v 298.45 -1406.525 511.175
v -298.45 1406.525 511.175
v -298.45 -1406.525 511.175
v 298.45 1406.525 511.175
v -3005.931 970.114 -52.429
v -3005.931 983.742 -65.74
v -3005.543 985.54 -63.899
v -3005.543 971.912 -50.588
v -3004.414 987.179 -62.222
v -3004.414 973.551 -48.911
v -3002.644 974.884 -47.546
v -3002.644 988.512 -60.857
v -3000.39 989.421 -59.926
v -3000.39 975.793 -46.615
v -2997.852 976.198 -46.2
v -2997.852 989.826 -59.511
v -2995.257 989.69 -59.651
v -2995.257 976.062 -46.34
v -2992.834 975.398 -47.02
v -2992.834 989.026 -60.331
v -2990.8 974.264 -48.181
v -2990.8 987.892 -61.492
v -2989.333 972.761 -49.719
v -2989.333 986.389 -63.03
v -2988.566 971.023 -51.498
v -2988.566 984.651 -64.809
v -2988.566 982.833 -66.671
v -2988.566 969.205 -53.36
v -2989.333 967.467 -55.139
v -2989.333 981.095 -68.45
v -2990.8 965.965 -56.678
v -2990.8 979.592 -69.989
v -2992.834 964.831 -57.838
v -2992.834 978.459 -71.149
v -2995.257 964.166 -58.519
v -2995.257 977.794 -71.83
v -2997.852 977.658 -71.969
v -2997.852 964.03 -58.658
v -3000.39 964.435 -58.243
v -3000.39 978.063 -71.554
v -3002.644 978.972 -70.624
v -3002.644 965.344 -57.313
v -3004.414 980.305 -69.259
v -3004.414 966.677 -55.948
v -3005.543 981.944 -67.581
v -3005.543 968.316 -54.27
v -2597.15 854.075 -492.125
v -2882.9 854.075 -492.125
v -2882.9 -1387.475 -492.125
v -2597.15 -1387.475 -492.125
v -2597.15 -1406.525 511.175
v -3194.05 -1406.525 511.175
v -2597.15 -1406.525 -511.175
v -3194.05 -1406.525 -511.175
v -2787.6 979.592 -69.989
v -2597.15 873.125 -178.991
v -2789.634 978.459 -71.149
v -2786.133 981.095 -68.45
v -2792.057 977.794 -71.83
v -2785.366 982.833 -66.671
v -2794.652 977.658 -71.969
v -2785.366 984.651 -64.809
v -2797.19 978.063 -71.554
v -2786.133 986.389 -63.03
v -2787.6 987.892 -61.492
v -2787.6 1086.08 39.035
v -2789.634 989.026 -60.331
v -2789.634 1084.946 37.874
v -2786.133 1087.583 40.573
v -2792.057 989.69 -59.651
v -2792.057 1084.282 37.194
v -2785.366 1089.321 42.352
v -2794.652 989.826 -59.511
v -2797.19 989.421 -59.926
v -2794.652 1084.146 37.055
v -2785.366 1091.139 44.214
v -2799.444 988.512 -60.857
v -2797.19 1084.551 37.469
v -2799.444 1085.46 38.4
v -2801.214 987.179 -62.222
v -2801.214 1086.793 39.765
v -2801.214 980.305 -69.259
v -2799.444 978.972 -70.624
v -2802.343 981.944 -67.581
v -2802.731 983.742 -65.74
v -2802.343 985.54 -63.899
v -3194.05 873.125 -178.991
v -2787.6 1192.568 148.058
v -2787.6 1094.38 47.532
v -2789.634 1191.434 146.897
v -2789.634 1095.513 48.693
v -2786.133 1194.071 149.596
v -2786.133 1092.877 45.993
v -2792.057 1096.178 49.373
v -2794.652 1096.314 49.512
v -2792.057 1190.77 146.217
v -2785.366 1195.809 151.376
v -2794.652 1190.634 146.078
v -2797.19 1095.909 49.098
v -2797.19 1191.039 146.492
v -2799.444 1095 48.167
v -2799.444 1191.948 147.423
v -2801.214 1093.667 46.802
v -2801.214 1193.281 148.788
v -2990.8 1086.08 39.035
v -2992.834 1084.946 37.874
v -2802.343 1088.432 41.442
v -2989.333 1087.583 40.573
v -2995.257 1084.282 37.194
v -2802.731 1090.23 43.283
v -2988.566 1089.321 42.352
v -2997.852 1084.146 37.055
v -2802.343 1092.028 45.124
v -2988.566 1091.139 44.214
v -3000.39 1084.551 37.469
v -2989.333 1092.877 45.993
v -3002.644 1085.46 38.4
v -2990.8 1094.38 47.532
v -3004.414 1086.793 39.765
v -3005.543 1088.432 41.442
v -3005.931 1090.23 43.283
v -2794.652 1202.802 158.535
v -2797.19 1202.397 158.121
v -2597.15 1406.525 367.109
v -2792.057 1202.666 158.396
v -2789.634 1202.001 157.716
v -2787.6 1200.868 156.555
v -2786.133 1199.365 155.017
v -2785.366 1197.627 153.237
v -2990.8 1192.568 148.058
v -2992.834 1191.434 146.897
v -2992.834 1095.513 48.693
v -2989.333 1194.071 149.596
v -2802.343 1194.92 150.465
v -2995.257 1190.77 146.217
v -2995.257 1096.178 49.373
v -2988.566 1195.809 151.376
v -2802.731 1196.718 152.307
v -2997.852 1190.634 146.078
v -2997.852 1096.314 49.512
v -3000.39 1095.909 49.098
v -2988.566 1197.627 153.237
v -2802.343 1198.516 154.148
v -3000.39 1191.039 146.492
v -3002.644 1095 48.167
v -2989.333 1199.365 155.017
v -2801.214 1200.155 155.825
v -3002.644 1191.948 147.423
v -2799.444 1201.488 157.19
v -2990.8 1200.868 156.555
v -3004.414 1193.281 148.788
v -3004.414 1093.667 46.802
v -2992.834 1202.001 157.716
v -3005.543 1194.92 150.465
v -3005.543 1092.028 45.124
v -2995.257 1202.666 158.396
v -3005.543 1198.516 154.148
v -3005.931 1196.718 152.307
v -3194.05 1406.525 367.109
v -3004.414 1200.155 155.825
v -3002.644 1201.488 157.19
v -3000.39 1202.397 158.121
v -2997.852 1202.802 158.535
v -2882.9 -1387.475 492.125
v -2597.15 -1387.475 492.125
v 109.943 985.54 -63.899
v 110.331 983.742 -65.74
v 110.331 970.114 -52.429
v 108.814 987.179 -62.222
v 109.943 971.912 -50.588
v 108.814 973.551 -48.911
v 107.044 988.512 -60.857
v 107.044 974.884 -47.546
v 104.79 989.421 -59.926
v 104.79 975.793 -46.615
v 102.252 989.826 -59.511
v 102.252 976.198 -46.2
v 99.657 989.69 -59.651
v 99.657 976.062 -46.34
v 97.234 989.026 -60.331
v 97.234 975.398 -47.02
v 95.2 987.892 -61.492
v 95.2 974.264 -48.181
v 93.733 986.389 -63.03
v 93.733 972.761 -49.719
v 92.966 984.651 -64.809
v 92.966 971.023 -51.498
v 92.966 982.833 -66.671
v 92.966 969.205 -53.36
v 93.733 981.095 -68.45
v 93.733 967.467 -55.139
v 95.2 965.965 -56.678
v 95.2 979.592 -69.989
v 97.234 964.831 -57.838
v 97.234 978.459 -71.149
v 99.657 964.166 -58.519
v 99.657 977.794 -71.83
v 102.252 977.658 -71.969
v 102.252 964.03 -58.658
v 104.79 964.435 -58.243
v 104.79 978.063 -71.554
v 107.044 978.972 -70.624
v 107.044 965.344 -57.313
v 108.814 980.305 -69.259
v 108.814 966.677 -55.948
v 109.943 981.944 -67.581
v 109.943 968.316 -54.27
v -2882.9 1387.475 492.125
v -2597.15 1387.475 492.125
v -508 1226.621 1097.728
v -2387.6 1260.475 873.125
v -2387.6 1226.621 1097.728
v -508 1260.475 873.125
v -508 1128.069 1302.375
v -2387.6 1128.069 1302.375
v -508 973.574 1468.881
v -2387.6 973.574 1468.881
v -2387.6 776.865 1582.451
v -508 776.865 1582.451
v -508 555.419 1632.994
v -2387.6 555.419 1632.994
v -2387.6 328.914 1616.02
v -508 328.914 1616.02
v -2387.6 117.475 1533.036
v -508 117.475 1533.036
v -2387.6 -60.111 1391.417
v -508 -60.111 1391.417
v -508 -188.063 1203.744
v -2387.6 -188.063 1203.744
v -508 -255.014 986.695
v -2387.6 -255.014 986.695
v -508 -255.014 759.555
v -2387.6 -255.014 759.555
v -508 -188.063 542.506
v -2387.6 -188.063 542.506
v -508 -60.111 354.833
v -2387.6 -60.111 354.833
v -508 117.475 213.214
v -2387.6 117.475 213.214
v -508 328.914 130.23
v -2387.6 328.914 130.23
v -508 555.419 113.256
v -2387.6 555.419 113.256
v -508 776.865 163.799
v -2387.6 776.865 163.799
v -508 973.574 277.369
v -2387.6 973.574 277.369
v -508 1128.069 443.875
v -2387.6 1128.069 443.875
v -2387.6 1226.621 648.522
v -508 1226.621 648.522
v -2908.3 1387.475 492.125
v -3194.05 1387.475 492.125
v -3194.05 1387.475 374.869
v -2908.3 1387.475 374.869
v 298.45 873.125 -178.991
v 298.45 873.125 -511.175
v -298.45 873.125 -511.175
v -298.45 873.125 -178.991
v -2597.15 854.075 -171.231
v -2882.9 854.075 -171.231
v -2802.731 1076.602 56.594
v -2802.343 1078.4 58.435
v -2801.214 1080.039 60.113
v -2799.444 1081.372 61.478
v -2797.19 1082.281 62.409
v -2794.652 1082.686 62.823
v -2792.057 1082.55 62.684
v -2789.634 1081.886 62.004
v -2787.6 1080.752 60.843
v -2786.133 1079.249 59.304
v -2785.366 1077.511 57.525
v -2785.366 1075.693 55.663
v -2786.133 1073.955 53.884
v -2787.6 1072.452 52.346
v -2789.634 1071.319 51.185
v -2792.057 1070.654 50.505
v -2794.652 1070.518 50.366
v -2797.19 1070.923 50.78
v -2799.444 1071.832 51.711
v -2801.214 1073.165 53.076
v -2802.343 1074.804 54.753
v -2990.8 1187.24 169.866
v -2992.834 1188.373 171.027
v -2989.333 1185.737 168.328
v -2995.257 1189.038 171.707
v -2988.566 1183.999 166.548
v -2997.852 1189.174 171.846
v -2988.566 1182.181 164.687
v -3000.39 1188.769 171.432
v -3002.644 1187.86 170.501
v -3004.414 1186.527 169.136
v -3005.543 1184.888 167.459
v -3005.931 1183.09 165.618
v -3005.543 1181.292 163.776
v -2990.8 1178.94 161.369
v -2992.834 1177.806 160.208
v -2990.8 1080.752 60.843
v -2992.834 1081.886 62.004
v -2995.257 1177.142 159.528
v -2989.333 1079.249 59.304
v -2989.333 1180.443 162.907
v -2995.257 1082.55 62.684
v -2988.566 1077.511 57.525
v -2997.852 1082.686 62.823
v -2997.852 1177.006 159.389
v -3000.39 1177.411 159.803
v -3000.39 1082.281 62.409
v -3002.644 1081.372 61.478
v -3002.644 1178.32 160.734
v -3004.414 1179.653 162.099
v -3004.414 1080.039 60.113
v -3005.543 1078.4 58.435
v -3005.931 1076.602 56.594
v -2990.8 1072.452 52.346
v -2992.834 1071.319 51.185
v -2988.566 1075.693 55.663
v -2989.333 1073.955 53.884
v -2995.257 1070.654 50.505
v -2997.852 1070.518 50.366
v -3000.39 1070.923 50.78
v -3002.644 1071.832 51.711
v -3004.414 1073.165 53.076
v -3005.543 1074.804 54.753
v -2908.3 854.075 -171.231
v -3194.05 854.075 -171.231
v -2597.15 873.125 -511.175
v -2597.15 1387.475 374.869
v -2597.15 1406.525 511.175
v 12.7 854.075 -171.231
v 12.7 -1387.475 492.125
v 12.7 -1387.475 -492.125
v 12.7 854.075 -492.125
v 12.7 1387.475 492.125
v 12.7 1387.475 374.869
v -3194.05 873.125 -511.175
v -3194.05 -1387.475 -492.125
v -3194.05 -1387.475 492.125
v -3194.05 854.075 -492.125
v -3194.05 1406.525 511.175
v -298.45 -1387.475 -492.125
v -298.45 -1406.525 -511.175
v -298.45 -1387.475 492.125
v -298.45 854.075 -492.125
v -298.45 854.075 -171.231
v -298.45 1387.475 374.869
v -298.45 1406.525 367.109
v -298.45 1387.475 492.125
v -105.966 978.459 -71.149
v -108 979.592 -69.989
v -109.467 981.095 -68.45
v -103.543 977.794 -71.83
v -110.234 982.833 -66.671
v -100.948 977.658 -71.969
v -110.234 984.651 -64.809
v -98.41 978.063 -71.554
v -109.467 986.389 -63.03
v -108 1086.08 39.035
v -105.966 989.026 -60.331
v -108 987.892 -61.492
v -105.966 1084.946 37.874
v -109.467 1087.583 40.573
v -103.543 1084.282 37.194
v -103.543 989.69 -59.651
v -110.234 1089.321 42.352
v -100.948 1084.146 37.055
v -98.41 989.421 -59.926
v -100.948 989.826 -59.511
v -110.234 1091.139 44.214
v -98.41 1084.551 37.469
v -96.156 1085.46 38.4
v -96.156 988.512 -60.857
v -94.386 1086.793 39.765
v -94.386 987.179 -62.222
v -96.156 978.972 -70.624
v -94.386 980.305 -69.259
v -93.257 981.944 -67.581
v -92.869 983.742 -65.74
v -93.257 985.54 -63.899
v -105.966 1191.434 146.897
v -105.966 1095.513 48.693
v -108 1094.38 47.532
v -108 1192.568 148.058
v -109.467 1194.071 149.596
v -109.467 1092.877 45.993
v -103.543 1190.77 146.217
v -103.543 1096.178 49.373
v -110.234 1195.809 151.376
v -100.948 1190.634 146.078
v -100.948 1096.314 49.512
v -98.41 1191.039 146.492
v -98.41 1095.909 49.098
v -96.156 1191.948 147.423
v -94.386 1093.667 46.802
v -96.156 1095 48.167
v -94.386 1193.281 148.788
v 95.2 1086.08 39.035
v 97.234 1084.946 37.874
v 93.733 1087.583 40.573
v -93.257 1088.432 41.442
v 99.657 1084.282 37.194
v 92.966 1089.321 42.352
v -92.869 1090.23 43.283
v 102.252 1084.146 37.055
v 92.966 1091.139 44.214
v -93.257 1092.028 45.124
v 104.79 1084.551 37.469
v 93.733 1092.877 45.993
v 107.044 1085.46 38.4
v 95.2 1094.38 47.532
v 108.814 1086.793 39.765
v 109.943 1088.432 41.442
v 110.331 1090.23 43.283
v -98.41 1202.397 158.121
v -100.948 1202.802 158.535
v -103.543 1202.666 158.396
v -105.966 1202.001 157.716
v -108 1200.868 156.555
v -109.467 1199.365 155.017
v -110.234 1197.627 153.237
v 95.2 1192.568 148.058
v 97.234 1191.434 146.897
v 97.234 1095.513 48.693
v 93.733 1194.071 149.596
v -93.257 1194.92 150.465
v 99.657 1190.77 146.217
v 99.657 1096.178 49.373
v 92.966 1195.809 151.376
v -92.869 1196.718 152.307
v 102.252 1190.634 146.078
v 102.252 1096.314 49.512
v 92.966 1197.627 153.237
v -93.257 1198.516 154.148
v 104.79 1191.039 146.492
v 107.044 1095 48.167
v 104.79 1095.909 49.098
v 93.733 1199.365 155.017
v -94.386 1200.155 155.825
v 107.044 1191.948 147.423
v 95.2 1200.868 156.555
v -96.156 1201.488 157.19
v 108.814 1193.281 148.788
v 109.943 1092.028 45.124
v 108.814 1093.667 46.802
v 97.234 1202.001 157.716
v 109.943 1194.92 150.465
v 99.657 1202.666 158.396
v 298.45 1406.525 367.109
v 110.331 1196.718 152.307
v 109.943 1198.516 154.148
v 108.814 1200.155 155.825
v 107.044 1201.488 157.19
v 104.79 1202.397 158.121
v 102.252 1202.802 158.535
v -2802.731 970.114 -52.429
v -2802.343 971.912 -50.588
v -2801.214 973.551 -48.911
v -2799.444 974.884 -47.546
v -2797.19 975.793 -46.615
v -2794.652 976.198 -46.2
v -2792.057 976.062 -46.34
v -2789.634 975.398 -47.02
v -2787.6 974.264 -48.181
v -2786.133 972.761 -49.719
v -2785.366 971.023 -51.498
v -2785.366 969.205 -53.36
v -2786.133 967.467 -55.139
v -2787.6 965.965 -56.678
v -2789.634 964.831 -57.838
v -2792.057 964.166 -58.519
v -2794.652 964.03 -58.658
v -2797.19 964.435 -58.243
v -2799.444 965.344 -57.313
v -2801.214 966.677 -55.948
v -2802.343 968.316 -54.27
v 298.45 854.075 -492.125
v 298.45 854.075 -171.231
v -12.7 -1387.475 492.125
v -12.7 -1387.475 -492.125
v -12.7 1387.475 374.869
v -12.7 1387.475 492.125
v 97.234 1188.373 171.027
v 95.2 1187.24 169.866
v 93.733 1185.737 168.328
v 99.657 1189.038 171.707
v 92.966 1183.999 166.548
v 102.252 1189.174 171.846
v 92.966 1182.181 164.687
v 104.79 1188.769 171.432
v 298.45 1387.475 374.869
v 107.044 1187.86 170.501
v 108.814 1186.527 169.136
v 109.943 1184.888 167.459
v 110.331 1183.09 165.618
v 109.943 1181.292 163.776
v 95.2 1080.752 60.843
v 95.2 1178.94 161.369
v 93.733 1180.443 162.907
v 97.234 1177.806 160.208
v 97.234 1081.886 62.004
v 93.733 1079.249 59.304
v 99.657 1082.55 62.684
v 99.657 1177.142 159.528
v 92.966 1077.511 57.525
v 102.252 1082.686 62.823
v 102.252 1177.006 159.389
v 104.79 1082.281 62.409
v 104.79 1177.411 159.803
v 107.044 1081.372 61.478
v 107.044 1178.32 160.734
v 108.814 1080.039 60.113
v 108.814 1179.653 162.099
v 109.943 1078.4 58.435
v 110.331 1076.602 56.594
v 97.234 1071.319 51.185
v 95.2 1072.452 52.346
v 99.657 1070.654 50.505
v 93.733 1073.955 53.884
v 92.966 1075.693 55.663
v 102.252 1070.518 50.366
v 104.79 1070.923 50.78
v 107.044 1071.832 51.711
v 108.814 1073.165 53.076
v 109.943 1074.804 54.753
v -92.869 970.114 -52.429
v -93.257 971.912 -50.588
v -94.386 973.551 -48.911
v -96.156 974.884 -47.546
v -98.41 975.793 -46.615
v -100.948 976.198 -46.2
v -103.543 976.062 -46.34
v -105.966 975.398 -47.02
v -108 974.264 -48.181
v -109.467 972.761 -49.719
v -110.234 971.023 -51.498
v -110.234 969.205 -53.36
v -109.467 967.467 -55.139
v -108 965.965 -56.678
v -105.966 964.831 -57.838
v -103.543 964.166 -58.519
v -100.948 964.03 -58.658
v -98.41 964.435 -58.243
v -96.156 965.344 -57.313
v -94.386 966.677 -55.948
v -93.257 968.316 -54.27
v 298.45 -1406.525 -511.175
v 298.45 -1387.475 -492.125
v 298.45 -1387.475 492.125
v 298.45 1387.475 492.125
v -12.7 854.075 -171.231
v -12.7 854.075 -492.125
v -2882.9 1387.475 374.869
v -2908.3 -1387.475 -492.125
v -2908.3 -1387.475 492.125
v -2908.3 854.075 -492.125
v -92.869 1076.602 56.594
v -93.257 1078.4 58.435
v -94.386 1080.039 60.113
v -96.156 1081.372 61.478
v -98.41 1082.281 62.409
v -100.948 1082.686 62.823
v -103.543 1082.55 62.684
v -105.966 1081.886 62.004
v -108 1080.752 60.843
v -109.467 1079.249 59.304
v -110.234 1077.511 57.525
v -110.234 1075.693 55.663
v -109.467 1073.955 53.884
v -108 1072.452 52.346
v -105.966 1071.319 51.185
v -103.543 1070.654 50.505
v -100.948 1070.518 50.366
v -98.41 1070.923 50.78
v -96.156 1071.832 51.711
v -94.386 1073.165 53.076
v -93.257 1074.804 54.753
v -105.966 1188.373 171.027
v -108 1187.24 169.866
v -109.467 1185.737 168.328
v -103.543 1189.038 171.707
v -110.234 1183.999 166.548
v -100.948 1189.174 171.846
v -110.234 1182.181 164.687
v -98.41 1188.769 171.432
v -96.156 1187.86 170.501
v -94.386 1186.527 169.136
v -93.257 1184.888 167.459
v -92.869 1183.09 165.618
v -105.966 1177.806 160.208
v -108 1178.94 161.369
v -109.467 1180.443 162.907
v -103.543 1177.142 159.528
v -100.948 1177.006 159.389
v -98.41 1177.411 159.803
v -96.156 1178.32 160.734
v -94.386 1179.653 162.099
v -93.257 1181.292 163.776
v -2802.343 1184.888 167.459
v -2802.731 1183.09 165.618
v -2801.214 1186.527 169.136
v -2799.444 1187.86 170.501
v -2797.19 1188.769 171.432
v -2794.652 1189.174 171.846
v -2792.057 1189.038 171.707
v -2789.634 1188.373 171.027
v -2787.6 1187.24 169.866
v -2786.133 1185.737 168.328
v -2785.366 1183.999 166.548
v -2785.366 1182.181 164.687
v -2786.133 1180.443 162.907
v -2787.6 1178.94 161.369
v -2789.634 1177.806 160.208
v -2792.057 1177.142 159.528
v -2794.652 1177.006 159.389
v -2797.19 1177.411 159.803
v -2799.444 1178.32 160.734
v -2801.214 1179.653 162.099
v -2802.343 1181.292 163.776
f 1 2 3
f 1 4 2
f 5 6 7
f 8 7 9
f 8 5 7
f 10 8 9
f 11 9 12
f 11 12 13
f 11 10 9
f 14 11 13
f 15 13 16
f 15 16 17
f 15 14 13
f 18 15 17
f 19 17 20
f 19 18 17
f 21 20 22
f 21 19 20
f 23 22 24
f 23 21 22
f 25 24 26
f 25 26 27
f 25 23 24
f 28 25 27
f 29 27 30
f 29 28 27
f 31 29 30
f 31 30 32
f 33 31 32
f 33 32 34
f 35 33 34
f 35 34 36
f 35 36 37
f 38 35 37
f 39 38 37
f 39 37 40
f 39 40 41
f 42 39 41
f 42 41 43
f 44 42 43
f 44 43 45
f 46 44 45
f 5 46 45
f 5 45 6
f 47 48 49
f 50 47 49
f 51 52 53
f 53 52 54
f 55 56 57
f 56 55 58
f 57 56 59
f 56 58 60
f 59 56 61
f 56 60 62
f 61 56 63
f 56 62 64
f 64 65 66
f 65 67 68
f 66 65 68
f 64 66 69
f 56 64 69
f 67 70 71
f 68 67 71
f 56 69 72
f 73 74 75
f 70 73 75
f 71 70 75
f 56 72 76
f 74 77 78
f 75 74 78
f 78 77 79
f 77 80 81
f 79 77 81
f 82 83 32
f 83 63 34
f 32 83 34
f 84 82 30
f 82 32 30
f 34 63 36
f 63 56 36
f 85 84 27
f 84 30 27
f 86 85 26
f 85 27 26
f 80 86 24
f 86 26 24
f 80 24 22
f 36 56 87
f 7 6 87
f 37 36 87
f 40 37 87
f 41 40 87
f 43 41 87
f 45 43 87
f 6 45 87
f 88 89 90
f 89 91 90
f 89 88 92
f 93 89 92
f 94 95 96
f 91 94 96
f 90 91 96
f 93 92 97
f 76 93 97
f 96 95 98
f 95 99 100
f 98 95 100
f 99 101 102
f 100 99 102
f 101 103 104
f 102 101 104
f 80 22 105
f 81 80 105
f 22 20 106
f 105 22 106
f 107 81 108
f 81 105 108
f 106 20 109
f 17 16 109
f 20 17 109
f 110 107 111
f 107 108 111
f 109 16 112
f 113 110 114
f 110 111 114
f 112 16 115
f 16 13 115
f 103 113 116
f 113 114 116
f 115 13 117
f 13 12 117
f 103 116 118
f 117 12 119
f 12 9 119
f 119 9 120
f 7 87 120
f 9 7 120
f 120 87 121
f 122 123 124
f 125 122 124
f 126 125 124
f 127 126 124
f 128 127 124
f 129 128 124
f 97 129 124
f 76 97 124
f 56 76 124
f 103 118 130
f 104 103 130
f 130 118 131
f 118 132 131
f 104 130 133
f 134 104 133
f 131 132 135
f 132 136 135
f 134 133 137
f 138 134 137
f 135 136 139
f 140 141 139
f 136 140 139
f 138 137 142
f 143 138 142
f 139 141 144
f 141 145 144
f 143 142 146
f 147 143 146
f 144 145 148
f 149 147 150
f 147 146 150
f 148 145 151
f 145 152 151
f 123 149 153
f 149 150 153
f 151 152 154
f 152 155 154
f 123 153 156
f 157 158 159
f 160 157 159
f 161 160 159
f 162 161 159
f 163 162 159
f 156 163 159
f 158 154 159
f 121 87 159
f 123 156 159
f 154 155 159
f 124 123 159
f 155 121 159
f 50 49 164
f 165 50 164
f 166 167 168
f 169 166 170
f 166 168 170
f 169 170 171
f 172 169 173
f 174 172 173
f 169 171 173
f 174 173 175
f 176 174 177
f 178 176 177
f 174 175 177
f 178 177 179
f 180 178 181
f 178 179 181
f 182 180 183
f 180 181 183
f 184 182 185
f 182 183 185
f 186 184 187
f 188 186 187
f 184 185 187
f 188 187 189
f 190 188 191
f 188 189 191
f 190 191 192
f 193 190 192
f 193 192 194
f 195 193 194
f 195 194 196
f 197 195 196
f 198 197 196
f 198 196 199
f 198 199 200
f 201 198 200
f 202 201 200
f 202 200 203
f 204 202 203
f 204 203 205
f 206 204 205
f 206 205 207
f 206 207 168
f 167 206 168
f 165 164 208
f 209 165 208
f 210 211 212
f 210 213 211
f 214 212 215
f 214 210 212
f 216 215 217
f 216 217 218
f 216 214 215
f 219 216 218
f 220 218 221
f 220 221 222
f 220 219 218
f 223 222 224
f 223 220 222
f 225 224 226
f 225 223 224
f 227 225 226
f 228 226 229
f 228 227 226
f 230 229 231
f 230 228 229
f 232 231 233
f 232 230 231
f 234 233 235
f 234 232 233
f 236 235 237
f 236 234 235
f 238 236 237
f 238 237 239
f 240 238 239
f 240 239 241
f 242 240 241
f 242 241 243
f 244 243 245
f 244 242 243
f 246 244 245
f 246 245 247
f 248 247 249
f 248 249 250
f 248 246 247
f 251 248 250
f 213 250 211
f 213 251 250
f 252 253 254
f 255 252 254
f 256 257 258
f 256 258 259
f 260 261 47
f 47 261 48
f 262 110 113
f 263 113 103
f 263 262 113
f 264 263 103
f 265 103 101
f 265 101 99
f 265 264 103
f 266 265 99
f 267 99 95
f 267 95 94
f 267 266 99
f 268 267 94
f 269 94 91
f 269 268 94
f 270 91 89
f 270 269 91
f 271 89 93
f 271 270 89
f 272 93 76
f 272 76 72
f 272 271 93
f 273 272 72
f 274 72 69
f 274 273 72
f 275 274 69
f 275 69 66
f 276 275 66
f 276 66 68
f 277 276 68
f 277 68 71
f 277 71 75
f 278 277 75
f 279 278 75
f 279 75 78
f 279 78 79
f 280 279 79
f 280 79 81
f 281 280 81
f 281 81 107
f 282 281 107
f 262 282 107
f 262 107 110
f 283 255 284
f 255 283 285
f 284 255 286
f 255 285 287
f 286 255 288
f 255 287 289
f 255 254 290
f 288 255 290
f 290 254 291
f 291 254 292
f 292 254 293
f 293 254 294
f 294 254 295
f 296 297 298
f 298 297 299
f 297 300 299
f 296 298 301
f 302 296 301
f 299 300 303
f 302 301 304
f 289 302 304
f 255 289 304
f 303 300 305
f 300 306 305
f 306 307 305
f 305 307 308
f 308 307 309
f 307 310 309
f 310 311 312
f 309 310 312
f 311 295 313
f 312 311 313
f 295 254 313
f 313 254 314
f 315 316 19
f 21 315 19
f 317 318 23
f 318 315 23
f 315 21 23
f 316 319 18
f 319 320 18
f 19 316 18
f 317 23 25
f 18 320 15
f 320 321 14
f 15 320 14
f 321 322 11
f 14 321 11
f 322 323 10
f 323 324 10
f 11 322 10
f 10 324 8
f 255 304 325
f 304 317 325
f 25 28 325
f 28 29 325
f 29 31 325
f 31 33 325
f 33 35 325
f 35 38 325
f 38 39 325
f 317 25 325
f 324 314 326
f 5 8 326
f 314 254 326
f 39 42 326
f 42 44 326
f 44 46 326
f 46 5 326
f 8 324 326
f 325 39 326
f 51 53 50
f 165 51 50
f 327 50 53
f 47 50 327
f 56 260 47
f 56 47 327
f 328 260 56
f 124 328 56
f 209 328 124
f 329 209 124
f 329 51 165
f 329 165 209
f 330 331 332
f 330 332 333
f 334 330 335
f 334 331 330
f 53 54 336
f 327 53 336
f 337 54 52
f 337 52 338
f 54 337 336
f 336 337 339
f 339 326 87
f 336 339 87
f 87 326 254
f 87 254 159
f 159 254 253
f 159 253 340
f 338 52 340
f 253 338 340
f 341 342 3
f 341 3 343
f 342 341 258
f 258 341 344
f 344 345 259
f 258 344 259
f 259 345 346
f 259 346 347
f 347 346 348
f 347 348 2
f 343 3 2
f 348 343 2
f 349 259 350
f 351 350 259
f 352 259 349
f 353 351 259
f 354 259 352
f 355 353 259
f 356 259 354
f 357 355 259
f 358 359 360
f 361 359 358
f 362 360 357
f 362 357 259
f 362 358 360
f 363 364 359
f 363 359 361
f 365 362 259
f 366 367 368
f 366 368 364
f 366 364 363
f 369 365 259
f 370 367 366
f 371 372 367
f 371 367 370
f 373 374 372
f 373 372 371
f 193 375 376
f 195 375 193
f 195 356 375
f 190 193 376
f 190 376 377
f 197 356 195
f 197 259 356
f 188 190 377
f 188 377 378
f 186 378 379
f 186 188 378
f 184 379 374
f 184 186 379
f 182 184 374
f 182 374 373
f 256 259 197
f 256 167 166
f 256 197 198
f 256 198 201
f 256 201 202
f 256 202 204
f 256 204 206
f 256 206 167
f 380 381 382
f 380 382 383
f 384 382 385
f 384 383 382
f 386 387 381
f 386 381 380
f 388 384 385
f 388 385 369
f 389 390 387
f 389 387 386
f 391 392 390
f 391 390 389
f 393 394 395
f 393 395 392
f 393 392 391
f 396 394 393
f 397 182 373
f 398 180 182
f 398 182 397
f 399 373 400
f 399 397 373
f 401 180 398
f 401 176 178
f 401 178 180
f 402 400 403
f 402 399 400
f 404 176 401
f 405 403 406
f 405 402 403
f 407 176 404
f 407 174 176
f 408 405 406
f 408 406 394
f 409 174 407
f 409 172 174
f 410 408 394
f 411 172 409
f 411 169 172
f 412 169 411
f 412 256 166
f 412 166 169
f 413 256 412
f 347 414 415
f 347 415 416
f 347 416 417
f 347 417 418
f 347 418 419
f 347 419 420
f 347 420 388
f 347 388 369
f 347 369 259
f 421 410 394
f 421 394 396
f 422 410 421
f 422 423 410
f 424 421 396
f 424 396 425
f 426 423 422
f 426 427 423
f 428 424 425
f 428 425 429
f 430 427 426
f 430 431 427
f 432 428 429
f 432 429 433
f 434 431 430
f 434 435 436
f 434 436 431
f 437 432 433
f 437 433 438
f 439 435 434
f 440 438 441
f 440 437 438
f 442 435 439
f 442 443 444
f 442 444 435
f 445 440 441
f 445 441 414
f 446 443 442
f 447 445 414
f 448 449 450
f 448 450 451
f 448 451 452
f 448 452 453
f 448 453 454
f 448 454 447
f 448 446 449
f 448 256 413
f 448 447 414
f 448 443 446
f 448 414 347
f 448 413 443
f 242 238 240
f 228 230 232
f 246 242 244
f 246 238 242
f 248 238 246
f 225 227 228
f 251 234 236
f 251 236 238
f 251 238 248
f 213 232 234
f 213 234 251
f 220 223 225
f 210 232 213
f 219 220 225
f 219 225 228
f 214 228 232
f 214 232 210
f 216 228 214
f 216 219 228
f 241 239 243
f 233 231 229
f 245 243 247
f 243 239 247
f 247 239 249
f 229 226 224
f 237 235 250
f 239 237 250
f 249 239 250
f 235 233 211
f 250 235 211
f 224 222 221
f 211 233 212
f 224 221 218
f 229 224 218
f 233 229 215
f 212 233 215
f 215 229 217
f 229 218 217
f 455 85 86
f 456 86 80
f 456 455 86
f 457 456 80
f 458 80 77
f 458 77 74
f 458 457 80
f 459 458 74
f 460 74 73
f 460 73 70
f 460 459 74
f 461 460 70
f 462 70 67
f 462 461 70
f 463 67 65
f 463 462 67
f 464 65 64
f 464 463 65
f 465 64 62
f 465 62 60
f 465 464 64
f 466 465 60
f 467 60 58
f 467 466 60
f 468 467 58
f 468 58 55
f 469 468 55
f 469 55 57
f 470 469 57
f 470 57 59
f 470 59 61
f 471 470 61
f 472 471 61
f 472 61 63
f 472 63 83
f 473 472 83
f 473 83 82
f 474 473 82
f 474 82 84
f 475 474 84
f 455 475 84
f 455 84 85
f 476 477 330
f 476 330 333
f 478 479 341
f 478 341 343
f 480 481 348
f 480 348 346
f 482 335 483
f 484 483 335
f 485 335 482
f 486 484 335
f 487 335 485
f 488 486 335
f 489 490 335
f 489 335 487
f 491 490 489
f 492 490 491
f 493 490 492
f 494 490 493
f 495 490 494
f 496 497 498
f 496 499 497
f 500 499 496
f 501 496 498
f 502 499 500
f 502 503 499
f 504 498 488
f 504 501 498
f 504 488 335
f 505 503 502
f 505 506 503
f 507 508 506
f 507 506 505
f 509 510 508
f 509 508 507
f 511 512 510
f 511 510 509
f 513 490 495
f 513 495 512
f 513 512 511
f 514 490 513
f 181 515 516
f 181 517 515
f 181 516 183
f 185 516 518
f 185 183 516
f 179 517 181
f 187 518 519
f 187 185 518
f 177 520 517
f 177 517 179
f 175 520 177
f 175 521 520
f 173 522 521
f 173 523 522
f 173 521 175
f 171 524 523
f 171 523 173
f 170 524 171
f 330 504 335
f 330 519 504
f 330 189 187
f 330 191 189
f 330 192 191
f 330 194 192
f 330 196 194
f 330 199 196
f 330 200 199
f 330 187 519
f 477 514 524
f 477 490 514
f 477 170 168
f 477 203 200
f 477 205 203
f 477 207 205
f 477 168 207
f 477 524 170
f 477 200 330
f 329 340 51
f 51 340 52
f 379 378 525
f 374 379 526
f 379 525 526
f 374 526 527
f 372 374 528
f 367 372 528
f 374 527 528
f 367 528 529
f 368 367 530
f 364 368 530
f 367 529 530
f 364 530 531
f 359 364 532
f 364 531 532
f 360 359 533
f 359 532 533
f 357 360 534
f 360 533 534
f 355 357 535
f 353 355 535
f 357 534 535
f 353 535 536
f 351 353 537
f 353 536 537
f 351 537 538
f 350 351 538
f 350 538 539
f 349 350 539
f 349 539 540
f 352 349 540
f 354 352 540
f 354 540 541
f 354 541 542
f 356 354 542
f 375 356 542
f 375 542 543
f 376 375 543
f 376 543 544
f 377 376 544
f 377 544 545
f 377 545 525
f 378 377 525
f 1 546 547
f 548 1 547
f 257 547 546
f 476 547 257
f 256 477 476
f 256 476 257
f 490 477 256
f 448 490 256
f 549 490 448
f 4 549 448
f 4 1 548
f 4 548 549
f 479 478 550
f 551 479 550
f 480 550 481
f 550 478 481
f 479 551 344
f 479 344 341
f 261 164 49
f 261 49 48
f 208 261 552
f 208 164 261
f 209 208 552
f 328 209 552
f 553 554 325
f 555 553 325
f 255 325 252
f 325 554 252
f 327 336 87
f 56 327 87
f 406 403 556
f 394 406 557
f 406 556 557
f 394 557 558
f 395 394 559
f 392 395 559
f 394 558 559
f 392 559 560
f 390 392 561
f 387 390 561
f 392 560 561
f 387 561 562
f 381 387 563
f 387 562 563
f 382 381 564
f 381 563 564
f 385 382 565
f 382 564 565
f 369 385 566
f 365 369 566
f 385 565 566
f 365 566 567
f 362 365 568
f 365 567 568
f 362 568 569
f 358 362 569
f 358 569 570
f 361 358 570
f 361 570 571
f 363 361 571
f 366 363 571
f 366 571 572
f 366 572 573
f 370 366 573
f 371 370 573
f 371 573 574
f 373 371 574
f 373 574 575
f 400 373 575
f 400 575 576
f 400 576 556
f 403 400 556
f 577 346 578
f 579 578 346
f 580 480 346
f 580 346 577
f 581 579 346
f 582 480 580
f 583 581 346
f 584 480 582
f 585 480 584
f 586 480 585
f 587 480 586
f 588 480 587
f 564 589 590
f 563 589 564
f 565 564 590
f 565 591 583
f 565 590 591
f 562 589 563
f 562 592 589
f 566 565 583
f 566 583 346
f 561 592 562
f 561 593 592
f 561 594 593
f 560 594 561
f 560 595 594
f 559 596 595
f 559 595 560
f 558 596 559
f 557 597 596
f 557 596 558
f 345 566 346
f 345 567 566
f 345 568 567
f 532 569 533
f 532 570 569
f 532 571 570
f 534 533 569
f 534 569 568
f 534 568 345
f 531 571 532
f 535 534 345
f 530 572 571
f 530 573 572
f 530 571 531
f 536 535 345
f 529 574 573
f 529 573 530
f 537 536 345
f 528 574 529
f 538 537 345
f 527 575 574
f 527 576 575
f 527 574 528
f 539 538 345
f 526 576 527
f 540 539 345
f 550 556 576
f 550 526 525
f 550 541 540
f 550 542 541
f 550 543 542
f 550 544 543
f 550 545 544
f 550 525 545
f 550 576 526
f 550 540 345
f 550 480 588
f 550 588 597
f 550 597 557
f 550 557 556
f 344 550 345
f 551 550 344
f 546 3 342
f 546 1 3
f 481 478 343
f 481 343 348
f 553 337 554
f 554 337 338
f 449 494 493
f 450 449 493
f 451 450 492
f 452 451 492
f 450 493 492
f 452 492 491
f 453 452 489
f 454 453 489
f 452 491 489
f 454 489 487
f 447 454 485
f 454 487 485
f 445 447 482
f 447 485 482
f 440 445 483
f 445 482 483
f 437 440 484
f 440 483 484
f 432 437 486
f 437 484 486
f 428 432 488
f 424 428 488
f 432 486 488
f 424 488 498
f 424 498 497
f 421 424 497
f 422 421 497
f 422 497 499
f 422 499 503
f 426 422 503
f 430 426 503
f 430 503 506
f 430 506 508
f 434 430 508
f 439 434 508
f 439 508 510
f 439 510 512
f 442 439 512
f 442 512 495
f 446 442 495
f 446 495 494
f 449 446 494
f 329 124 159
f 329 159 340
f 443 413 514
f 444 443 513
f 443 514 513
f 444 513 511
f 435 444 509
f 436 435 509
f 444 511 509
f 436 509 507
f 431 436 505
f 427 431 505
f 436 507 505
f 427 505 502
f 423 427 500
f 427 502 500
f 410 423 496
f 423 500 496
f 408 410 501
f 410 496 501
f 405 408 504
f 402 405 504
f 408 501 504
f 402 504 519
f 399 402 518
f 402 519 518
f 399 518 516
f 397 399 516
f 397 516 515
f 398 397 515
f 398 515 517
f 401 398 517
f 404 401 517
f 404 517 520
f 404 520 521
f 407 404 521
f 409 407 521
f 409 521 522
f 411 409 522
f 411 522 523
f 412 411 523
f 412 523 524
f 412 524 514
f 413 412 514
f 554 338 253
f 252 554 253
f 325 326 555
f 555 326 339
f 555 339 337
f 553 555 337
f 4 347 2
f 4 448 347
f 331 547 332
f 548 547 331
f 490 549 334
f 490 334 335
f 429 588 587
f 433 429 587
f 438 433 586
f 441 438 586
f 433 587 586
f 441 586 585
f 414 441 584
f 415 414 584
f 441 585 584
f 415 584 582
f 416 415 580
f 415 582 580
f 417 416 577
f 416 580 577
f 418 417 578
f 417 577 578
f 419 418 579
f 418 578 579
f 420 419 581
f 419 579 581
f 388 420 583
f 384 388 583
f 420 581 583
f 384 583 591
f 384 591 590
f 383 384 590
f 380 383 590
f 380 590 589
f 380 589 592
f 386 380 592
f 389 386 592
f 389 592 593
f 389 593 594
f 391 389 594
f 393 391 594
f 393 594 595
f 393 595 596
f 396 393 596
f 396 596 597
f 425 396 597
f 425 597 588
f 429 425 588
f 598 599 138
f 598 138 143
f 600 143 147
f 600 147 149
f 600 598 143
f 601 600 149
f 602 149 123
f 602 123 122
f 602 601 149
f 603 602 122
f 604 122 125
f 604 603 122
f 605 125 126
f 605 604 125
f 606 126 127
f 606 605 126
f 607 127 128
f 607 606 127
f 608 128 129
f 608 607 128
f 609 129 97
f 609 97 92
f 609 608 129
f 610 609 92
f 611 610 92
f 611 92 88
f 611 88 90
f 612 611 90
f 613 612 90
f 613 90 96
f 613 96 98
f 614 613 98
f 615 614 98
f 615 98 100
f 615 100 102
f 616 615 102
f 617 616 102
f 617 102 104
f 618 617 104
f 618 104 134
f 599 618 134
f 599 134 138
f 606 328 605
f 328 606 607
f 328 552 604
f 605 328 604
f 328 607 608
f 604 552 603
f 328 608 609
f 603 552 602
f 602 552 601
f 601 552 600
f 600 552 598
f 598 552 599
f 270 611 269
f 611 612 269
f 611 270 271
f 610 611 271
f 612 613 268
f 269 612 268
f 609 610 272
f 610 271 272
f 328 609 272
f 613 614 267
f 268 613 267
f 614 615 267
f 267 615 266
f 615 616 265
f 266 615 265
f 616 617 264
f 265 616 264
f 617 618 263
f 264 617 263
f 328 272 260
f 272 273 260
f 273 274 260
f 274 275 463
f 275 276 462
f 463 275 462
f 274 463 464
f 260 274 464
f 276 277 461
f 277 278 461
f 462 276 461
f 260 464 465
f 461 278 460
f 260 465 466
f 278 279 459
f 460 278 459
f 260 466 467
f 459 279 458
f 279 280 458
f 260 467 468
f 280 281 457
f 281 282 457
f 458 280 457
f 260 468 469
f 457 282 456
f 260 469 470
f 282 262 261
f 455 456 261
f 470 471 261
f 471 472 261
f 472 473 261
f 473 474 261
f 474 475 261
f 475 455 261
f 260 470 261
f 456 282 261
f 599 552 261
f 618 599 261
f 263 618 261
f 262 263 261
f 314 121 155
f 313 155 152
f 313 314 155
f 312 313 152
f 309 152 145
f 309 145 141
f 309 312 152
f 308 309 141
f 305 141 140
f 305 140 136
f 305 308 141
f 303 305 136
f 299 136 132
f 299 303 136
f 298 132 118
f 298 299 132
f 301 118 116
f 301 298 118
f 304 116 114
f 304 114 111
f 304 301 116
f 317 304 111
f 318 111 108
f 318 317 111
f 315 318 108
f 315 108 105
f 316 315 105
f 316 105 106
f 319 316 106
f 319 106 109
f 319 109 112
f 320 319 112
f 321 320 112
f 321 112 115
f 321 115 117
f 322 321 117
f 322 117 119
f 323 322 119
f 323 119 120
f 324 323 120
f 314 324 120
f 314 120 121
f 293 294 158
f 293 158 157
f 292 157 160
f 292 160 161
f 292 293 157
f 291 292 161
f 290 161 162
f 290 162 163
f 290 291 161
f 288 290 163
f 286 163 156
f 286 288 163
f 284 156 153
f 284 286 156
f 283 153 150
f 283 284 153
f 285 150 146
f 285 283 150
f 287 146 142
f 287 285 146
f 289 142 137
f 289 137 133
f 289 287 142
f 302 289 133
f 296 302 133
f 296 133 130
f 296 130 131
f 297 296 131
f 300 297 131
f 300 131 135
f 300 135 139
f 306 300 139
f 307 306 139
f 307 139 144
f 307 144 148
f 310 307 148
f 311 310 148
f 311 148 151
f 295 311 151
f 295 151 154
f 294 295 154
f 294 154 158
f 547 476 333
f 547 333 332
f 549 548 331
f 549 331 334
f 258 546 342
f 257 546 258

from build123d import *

# Parameters (mm, degrees)
F1_DEPTH  = 298.45
F2_DEPTH  = 12.7
F5_DEPTH  = 152.4
F7_D      = 17.4625
F7_DEPTH  = 25.4
F7_TIP    = 5.2462642799
F10_R     = 762
F11_DEPTH = 939.8


with BuildPart() as f1:
    # F0 (on Right) → F1 (new body, symmetric)
    with BuildSketch(Plane.YZ):
        Polygon((-1406.525, 511.175), (-1406.525, -511.175), (873.125, -511.175), (873.125, -178.9909222886), (1406.525, 367.1090777114), (1406.525, 511.175), align=None)
        Polygon((854.075, -492.125), (-1387.475, -492.125), (-1387.475, 492.125), (1387.475, 492.125), (1387.475, 374.8688846221), (854.075, -171.2311153779), align=None, mode=Mode.SUBTRACT)
    extrude(amount=F1_DEPTH, both=True)

    # F0 (on Right) → F2 (join, symmetric)
    with BuildSketch(Plane.YZ):
        Polygon((-1387.475, 492.125), (-1387.475, -492.125), (854.075, -492.125), (854.075, -171.2311153779), (1387.475, 374.8688846221), (1387.475, 492.125), align=None)
    extrude(amount=F2_DEPTH, both=True)

    # F7
    with Locations(Plane(origin=(0, 536.3038280247, -523.8316459776), x_dir=(-1, 0, 0), z_dir=(0, 0.7153761792, -0.6987395239))):
        with Locations((-101.6, 640.3505450322), (-101.6, 792.7505450322), (-101.6, 945.1505450322), (101.6, 945.1505450322), (101.6, 792.7505450322), (101.6, 640.3505450322)):
            Hole(F7_D / 2, depth=F7_DEPTH)
            with Locations((0, 0, -(F7_DEPTH + F7_TIP / 2))):  # 118° drill point
                Cone(0, F7_D / 2, F7_TIP, mode=Mode.SUBTRACT)


with BuildPart() as f5:
    # F4 (on face) → F5 (new body)
    with BuildSketch(Plane.YZ.offset(298.45)):
        Polygon((1547.2405520028, 511.175), (1406.525, 511.175), (1406.525, 367.1090777114), align=None)
    extrude(amount=F5_DEPTH)


with BuildPart() as f9_1:
    # F9: instance of F1
    add(f1.part.mirror(Plane(origin=(-1447.8, -93.0328602269, 39.6868545201), x_dir=(0, 1, 0), z_dir=(1, 0, 0))))


with BuildPart() as f11:
    # F10 (on offset) → F11 (new body, symmetric)
    with BuildSketch(Plane.YZ.offset(-1447.8)):
        with Locations((498.475, 873.125)):
            Circle(F10_R)
    extrude(amount=F11_DEPTH, both=True)


solid = Compound([f1.part, f9_1.part, f11.part])
